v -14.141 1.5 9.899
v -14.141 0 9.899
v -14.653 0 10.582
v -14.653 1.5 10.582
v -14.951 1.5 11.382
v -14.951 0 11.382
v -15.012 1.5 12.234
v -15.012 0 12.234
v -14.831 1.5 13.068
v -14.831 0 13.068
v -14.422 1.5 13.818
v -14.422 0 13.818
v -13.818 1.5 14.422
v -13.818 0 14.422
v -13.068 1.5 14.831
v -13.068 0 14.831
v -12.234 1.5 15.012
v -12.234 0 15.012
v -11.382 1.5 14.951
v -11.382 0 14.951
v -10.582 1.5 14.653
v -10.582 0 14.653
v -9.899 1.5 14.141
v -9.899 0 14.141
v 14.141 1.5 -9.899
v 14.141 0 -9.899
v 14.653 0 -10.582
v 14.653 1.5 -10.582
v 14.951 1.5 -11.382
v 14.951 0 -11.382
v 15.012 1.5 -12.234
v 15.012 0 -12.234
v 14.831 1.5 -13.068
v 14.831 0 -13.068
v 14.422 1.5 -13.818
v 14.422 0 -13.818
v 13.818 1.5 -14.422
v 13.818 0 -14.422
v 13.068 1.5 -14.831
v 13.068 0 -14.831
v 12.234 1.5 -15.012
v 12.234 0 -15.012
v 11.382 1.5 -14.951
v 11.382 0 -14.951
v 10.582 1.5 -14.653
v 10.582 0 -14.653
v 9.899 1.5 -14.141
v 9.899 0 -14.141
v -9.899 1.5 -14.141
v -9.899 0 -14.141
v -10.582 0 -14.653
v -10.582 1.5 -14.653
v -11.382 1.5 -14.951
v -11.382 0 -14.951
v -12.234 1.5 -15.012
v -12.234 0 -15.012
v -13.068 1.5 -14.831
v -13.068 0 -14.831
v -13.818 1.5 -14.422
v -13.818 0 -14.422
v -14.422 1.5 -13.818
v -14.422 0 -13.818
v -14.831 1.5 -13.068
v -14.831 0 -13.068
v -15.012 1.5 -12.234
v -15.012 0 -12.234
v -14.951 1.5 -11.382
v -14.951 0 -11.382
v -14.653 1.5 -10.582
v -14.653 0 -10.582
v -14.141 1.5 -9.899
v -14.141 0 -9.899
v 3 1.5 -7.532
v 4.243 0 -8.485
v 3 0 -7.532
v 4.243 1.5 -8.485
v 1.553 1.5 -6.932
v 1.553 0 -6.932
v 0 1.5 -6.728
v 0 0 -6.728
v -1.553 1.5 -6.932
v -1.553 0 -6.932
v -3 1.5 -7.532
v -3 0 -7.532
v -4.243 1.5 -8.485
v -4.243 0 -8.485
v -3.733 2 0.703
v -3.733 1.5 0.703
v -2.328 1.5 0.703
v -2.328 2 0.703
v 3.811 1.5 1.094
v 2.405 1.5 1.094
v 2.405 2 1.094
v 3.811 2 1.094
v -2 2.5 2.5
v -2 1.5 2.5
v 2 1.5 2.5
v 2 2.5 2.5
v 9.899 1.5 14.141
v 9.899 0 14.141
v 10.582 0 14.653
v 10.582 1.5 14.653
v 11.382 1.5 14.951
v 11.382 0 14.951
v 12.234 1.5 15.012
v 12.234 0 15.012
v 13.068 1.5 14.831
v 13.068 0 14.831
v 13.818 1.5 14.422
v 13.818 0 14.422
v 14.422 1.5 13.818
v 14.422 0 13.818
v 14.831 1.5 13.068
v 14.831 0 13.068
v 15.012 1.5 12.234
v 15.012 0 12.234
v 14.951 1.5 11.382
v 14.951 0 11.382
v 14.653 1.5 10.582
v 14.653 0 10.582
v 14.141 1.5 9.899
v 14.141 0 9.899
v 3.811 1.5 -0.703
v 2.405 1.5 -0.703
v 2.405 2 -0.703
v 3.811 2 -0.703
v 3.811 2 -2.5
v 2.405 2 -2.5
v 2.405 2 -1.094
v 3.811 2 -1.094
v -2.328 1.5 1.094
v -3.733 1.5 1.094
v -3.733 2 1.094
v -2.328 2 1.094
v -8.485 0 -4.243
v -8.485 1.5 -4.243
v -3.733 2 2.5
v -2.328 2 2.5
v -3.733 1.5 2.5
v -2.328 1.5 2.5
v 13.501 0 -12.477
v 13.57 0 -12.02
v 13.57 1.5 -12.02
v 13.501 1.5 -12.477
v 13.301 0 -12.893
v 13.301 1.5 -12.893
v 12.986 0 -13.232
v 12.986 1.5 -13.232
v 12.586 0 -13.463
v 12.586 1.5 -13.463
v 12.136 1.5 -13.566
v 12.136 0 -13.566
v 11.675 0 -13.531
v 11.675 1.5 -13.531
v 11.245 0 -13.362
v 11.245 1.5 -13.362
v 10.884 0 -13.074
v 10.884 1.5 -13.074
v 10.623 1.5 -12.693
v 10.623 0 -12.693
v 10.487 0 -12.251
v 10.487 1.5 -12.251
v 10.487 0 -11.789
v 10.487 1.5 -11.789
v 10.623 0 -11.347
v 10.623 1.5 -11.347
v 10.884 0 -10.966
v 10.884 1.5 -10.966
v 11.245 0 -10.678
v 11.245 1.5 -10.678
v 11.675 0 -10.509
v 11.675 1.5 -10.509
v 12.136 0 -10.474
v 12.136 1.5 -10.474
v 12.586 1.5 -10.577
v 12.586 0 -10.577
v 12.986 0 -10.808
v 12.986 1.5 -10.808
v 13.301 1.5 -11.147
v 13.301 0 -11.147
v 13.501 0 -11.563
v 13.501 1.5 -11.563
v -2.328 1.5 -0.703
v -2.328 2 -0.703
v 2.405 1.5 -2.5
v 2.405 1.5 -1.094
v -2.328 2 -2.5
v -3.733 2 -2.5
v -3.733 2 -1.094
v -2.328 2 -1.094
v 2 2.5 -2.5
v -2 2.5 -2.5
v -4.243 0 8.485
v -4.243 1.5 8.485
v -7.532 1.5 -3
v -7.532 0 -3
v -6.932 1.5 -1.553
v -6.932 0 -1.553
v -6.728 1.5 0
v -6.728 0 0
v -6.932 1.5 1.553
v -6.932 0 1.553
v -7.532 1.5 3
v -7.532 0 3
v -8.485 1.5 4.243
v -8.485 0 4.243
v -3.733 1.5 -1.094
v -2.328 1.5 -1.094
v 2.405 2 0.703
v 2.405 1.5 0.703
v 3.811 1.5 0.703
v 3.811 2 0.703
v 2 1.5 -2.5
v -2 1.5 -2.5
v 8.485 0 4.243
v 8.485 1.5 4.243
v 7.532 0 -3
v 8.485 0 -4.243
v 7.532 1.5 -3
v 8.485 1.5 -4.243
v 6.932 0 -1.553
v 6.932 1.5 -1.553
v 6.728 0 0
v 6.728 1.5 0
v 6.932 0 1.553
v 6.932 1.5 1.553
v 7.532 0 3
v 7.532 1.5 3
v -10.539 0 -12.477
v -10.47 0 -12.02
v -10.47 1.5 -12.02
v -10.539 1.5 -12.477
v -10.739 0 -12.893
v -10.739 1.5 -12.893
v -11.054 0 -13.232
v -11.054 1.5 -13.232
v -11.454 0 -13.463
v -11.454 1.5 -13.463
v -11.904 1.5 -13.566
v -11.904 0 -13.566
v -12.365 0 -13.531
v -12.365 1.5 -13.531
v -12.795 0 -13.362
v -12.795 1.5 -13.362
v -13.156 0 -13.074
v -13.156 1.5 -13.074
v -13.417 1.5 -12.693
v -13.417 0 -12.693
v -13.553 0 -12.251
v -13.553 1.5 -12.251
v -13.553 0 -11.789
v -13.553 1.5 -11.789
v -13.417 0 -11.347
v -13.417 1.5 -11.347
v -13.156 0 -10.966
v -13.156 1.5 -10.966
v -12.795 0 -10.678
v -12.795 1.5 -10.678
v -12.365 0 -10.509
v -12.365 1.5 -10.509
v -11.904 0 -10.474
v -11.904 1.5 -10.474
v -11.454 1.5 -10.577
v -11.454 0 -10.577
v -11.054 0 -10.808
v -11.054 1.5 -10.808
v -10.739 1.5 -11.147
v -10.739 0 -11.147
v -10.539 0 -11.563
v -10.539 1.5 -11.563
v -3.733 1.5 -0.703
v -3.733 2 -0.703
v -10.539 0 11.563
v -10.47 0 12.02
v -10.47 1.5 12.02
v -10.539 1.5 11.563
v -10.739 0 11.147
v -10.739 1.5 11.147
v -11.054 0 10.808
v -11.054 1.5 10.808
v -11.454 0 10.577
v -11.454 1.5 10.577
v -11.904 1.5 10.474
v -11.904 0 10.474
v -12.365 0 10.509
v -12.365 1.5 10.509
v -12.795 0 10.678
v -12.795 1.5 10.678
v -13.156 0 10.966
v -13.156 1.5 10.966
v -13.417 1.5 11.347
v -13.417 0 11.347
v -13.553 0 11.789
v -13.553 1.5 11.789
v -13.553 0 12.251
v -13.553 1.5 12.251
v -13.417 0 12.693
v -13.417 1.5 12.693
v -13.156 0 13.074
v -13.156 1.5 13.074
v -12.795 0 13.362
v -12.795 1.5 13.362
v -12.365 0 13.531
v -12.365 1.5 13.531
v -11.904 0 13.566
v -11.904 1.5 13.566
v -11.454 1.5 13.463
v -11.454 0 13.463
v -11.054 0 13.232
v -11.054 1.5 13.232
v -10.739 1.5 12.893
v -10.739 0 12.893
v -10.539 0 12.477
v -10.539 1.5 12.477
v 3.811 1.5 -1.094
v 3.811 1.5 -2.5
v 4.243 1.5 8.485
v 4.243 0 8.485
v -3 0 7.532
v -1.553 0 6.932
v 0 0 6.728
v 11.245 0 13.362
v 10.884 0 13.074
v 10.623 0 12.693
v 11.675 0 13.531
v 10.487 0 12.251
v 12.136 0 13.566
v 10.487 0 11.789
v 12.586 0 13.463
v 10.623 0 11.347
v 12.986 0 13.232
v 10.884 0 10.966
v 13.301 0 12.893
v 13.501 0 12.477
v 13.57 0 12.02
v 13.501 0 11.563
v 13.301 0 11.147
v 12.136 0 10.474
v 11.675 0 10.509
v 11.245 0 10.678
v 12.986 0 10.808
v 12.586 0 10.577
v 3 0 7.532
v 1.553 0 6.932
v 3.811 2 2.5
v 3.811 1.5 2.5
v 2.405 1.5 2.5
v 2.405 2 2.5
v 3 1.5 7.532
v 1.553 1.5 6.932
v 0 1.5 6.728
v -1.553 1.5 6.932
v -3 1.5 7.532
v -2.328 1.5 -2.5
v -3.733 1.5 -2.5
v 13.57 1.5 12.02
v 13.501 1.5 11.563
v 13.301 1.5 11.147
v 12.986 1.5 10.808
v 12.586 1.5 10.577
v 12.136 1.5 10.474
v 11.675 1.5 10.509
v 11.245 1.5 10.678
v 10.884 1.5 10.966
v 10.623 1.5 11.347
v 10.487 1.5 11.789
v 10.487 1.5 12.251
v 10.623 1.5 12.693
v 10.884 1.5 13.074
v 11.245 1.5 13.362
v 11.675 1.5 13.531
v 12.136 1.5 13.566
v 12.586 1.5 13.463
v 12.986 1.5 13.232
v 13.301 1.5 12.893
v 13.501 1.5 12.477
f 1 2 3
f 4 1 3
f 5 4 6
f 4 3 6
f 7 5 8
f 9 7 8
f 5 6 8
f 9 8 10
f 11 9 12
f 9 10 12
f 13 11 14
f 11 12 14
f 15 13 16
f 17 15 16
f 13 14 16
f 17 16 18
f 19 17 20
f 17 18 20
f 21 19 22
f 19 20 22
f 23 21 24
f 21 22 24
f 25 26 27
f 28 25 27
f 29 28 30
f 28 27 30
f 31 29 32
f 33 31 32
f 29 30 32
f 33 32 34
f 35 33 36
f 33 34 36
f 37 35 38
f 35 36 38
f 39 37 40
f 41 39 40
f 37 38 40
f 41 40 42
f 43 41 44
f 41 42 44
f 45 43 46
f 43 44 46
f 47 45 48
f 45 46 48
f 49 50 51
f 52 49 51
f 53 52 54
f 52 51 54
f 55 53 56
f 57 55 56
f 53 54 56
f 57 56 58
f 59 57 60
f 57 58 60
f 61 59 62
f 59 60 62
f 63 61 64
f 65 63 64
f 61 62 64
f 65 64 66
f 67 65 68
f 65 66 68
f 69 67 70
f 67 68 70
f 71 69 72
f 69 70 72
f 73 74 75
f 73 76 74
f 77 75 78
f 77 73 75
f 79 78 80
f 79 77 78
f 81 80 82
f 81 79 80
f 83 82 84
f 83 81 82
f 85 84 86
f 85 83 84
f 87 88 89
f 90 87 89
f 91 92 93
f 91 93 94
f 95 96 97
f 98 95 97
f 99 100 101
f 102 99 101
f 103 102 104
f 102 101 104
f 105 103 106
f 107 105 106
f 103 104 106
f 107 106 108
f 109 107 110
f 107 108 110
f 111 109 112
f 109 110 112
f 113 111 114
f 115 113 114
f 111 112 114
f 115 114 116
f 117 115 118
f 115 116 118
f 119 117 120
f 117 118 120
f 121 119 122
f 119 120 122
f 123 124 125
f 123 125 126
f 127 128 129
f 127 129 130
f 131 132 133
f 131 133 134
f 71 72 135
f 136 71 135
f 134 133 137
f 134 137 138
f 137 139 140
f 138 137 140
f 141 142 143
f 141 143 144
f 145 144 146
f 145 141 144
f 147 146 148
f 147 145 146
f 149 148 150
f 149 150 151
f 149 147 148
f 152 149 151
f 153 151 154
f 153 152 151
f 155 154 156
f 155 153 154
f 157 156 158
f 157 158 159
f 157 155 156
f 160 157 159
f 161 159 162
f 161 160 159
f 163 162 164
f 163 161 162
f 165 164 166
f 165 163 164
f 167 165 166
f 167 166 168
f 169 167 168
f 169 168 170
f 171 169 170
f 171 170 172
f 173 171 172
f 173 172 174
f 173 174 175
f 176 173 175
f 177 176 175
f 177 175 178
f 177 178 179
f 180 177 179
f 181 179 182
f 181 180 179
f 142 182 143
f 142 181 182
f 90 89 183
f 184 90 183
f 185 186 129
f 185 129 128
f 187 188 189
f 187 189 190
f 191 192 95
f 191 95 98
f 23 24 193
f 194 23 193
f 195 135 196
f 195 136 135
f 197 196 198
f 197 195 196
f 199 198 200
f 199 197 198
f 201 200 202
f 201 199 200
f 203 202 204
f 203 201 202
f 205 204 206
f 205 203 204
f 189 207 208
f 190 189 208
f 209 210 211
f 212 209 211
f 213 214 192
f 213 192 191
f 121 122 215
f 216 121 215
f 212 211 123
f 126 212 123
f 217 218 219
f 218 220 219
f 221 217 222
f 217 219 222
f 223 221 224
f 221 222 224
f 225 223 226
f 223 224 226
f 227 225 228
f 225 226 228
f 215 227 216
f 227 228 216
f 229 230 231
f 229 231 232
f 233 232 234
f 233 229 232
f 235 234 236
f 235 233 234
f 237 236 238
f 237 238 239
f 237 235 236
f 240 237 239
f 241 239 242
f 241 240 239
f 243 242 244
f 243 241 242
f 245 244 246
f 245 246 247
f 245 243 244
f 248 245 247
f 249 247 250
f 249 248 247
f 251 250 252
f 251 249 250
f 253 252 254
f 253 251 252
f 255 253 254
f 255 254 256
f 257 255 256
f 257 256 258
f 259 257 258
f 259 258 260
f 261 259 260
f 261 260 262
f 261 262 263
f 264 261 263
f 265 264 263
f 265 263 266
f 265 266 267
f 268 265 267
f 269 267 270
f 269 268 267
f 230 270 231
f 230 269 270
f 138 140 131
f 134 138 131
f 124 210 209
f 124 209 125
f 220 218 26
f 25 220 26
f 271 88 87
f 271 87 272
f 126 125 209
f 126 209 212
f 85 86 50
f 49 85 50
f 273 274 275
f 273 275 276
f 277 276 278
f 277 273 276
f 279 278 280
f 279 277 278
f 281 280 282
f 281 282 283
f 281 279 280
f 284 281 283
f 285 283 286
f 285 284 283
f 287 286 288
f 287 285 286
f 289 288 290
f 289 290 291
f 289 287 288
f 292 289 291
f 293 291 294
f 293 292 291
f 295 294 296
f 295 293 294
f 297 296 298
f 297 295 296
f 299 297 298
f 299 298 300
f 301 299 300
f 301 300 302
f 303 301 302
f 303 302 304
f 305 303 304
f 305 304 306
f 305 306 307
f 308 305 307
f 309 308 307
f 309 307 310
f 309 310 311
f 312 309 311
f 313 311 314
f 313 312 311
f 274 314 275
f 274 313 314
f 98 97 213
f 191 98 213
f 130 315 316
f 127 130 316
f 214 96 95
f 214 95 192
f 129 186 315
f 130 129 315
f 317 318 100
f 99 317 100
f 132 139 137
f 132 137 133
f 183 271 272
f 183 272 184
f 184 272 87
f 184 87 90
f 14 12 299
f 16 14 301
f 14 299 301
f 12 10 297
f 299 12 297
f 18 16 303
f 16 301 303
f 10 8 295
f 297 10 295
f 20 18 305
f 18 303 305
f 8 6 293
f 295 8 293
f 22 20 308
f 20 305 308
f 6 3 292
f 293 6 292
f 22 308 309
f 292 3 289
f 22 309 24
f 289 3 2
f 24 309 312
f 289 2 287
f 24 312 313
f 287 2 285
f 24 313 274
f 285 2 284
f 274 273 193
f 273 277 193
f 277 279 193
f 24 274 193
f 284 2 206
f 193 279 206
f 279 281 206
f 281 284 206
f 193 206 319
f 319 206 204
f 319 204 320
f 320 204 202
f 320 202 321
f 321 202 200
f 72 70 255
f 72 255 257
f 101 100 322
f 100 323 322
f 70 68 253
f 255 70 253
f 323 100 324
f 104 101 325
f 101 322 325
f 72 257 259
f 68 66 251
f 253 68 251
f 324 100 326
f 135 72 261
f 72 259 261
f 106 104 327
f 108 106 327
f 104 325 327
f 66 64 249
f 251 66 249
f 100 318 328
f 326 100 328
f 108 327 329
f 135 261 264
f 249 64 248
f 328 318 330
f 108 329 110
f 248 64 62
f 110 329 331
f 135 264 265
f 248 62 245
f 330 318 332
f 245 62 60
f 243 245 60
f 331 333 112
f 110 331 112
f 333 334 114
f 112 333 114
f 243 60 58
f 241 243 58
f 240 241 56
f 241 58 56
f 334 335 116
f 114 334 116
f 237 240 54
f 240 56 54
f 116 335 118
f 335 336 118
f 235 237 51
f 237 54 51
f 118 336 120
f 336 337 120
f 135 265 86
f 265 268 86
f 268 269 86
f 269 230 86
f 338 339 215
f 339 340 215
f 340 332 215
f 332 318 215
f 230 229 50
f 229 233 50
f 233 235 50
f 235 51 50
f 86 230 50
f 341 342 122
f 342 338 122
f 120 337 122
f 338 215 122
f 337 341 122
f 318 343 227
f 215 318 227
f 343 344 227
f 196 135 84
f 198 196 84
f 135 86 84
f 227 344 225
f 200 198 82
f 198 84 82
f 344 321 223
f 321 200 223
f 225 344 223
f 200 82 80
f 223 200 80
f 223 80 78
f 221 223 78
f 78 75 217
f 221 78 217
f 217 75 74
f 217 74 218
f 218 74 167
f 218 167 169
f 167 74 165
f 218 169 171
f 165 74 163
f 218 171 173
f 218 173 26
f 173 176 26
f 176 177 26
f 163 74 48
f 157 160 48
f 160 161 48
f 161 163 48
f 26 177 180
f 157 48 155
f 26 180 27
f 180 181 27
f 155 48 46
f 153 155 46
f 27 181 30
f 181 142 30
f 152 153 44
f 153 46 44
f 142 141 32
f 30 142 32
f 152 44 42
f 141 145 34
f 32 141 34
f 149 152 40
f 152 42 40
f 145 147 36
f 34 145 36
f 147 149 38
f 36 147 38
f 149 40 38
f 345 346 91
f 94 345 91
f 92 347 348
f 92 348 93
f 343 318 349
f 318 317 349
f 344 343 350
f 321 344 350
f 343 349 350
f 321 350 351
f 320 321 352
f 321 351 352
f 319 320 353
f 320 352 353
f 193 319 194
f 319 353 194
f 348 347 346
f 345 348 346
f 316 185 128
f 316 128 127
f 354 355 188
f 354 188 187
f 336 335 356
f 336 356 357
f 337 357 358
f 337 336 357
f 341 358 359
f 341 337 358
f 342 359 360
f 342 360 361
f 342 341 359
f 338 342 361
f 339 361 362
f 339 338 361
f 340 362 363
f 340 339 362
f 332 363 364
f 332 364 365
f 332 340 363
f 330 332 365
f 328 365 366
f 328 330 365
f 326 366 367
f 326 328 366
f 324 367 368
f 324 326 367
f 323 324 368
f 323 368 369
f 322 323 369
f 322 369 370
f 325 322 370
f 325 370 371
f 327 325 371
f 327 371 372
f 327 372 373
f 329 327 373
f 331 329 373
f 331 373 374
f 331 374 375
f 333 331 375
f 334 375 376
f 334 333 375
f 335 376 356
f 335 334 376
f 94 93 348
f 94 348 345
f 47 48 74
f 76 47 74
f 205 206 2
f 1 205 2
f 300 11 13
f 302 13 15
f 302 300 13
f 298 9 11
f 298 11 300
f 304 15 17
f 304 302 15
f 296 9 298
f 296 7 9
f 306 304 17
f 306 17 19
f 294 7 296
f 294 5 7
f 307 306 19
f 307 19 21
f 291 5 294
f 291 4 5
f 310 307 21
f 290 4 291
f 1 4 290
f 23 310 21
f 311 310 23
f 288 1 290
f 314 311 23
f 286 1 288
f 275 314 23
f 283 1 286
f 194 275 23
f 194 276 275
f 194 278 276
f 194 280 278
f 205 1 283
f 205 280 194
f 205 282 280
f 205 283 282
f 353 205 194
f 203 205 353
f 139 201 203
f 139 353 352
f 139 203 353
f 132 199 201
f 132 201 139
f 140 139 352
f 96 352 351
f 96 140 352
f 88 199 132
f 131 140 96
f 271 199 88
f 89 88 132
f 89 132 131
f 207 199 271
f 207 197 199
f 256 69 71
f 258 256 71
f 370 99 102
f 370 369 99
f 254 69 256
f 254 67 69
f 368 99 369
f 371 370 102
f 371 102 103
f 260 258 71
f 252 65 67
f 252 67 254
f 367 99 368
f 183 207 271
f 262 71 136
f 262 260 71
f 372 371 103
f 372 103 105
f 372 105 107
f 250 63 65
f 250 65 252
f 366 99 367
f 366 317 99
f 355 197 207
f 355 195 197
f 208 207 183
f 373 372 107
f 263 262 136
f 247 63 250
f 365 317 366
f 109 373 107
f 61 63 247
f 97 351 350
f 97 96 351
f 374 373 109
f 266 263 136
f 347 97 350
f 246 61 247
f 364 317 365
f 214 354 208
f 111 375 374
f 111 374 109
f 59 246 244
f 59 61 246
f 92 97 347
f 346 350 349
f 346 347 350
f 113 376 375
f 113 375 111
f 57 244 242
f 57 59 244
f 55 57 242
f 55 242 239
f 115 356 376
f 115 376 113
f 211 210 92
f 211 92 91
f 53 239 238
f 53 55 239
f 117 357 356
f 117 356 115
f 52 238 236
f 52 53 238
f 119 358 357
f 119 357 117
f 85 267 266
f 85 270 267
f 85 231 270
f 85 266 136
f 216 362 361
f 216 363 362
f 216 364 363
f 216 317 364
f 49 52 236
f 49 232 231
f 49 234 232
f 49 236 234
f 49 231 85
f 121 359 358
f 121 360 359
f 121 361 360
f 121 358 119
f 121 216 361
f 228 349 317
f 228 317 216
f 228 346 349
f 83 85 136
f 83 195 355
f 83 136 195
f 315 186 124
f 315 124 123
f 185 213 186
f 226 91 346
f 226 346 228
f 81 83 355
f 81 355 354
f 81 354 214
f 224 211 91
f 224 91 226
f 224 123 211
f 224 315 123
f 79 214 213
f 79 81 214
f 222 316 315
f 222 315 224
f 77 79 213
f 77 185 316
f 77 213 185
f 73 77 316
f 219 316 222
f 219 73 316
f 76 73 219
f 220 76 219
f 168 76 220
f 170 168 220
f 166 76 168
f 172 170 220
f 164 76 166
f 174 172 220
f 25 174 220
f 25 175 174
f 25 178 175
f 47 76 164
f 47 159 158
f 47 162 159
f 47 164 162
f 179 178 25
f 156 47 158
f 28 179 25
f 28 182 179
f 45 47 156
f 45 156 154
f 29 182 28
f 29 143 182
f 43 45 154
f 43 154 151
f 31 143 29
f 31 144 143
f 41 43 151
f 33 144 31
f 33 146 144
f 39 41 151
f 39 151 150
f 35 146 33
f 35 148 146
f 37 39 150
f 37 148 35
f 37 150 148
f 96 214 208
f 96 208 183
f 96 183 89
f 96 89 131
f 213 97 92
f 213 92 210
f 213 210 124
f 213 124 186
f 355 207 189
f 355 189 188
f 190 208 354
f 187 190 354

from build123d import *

# Parameters (mm, degrees)
SKETCH1_R           = 1.55
BOSS_EXTRUDE1_DEPTH = 1.5
FILLET1_R           = 6
SKETCH2_W           = 4
SKETCH2_H           = 5
BOSS_EXTRUDE2_DEPTH = 1
SKETCH3_W           = 1.405588528
SKETCH3_H           = 1.405588528
BOSS_EXTRUDE3_DEPTH = 0.5


with BuildPart() as part:
    # Sketch1 → Boss-Extrude1 (new body)
    with BuildSketch(Plane(origin=(0, 0, 0), x_dir=(1, 0, 0), z_dir=(0, 1, 0))):
        with BuildLine():
            Line((9.898679656, 14.141320344), (0, 4.242640687))
            Line((0, 4.242640687), (4.242640687, 0))
            Line((4.242640687, 0), (14.141320344, 9.898679656))
            ThreePointArc((14.141320344, 9.898679656), (14.141320344, 14.141320344), (9.898679656, 14.141320344))
        make_face()
        with Locations((12.02, 12.02)):
            Circle(SKETCH1_R, mode=Mode.SUBTRACT)
        with BuildLine():
            Line((-14.141320344, 9.898679656), (-4.242640687, 0))
            Line((-4.242640687, 0), (0, 4.242640687))
            Line((0, 4.242640687), (-9.898679656, 14.141320344))
            ThreePointArc((-9.898679656, 14.141320344), (-14.141320344, 14.141320344), (-14.141320344, 9.898679656))
        make_face()
        with Locations((-12.02, 12.02)):
            Circle(SKETCH1_R, mode=Mode.SUBTRACT)
        Polygon((0, 4.242640687), (-4.242640687, 0), (0, -4.242640687), (4.242640687, 0), align=None)
        with BuildLine():
            Line((4.242640687, 0), (0, -4.242640687))
            Line((0, -4.242640687), (9.898679656, -14.141320344))
            ThreePointArc((9.898679656, -14.141320344), (14.141320344, -14.141320344), (14.141320344, -9.898679656))
            Line((14.141320344, -9.898679656), (4.242640687, 0))
        make_face()
        with Locations((12.02, -12.02)):
            Circle(SKETCH1_R, mode=Mode.SUBTRACT)
        with BuildLine():
            Line((-4.242640687, 0), (-14.141320344, -9.898679656))
            ThreePointArc((-14.141320344, -9.898679656), (-14.141320344, -14.141320344), (-9.898679656, -14.141320344))
            Line((-9.898679656, -14.141320344), (0, -4.242640687))
            Line((0, -4.242640687), (-4.242640687, 0))
        make_face()
        with Locations((-12.02, -12.02)):
            Circle(SKETCH1_R, mode=Mode.SUBTRACT)
    extrude(amount=BOSS_EXTRUDE1_DEPTH)

    # Fillet1
    fillet1_edges = [part.edges().sort_by_distance(p)[0] for p in [
        (4.242640687, 0.75, 0),
        (0, 0.75, 4.242640687),
        (-4.242640687, 0.75, 0),
        (0, 0.75, -4.242640687),
    ]]
    fillet(fillet1_edges, radius=FILLET1_R)

    # Sketch2 → Boss-Extrude2 (add)
    with BuildSketch(Plane(origin=(0, 1.5, 0), x_dir=(1, 0, 0), z_dir=(0, 1, 0))):
        Rectangle(SKETCH2_W, SKETCH2_H)
    extrude(amount=BOSS_EXTRUDE2_DEPTH)

    # Sketch3 → Boss-Extrude3 (add)
    with BuildSketch(Plane(origin=(0, 1.5, 0), x_dir=(1, 0, 0), z_dir=(0, 1, 0))):
        with Locations((-3.030370202, -1.797205736)):
            Rectangle(SKETCH3_W, SKETCH3_H)
        with Locations((-3.030370202, 0)):
            Rectangle(SKETCH3_W, SKETCH3_H)
        with Locations((-3.030370202, 1.797205736)):
            Rectangle(SKETCH3_W, SKETCH3_H)
        with Locations((3.108126605, 0)):
            Rectangle(SKETCH3_W, SKETCH3_H)
        with Locations((3.108126605, -1.797205736)):
            Rectangle(SKETCH3_W, SKETCH3_H)
        with Locations((3.108126605, 1.797205736)):
            Rectangle(SKETCH3_W, SKETCH3_H)
    extrude(amount=BOSS_EXTRUDE3_DEPTH)


solid = part.part
